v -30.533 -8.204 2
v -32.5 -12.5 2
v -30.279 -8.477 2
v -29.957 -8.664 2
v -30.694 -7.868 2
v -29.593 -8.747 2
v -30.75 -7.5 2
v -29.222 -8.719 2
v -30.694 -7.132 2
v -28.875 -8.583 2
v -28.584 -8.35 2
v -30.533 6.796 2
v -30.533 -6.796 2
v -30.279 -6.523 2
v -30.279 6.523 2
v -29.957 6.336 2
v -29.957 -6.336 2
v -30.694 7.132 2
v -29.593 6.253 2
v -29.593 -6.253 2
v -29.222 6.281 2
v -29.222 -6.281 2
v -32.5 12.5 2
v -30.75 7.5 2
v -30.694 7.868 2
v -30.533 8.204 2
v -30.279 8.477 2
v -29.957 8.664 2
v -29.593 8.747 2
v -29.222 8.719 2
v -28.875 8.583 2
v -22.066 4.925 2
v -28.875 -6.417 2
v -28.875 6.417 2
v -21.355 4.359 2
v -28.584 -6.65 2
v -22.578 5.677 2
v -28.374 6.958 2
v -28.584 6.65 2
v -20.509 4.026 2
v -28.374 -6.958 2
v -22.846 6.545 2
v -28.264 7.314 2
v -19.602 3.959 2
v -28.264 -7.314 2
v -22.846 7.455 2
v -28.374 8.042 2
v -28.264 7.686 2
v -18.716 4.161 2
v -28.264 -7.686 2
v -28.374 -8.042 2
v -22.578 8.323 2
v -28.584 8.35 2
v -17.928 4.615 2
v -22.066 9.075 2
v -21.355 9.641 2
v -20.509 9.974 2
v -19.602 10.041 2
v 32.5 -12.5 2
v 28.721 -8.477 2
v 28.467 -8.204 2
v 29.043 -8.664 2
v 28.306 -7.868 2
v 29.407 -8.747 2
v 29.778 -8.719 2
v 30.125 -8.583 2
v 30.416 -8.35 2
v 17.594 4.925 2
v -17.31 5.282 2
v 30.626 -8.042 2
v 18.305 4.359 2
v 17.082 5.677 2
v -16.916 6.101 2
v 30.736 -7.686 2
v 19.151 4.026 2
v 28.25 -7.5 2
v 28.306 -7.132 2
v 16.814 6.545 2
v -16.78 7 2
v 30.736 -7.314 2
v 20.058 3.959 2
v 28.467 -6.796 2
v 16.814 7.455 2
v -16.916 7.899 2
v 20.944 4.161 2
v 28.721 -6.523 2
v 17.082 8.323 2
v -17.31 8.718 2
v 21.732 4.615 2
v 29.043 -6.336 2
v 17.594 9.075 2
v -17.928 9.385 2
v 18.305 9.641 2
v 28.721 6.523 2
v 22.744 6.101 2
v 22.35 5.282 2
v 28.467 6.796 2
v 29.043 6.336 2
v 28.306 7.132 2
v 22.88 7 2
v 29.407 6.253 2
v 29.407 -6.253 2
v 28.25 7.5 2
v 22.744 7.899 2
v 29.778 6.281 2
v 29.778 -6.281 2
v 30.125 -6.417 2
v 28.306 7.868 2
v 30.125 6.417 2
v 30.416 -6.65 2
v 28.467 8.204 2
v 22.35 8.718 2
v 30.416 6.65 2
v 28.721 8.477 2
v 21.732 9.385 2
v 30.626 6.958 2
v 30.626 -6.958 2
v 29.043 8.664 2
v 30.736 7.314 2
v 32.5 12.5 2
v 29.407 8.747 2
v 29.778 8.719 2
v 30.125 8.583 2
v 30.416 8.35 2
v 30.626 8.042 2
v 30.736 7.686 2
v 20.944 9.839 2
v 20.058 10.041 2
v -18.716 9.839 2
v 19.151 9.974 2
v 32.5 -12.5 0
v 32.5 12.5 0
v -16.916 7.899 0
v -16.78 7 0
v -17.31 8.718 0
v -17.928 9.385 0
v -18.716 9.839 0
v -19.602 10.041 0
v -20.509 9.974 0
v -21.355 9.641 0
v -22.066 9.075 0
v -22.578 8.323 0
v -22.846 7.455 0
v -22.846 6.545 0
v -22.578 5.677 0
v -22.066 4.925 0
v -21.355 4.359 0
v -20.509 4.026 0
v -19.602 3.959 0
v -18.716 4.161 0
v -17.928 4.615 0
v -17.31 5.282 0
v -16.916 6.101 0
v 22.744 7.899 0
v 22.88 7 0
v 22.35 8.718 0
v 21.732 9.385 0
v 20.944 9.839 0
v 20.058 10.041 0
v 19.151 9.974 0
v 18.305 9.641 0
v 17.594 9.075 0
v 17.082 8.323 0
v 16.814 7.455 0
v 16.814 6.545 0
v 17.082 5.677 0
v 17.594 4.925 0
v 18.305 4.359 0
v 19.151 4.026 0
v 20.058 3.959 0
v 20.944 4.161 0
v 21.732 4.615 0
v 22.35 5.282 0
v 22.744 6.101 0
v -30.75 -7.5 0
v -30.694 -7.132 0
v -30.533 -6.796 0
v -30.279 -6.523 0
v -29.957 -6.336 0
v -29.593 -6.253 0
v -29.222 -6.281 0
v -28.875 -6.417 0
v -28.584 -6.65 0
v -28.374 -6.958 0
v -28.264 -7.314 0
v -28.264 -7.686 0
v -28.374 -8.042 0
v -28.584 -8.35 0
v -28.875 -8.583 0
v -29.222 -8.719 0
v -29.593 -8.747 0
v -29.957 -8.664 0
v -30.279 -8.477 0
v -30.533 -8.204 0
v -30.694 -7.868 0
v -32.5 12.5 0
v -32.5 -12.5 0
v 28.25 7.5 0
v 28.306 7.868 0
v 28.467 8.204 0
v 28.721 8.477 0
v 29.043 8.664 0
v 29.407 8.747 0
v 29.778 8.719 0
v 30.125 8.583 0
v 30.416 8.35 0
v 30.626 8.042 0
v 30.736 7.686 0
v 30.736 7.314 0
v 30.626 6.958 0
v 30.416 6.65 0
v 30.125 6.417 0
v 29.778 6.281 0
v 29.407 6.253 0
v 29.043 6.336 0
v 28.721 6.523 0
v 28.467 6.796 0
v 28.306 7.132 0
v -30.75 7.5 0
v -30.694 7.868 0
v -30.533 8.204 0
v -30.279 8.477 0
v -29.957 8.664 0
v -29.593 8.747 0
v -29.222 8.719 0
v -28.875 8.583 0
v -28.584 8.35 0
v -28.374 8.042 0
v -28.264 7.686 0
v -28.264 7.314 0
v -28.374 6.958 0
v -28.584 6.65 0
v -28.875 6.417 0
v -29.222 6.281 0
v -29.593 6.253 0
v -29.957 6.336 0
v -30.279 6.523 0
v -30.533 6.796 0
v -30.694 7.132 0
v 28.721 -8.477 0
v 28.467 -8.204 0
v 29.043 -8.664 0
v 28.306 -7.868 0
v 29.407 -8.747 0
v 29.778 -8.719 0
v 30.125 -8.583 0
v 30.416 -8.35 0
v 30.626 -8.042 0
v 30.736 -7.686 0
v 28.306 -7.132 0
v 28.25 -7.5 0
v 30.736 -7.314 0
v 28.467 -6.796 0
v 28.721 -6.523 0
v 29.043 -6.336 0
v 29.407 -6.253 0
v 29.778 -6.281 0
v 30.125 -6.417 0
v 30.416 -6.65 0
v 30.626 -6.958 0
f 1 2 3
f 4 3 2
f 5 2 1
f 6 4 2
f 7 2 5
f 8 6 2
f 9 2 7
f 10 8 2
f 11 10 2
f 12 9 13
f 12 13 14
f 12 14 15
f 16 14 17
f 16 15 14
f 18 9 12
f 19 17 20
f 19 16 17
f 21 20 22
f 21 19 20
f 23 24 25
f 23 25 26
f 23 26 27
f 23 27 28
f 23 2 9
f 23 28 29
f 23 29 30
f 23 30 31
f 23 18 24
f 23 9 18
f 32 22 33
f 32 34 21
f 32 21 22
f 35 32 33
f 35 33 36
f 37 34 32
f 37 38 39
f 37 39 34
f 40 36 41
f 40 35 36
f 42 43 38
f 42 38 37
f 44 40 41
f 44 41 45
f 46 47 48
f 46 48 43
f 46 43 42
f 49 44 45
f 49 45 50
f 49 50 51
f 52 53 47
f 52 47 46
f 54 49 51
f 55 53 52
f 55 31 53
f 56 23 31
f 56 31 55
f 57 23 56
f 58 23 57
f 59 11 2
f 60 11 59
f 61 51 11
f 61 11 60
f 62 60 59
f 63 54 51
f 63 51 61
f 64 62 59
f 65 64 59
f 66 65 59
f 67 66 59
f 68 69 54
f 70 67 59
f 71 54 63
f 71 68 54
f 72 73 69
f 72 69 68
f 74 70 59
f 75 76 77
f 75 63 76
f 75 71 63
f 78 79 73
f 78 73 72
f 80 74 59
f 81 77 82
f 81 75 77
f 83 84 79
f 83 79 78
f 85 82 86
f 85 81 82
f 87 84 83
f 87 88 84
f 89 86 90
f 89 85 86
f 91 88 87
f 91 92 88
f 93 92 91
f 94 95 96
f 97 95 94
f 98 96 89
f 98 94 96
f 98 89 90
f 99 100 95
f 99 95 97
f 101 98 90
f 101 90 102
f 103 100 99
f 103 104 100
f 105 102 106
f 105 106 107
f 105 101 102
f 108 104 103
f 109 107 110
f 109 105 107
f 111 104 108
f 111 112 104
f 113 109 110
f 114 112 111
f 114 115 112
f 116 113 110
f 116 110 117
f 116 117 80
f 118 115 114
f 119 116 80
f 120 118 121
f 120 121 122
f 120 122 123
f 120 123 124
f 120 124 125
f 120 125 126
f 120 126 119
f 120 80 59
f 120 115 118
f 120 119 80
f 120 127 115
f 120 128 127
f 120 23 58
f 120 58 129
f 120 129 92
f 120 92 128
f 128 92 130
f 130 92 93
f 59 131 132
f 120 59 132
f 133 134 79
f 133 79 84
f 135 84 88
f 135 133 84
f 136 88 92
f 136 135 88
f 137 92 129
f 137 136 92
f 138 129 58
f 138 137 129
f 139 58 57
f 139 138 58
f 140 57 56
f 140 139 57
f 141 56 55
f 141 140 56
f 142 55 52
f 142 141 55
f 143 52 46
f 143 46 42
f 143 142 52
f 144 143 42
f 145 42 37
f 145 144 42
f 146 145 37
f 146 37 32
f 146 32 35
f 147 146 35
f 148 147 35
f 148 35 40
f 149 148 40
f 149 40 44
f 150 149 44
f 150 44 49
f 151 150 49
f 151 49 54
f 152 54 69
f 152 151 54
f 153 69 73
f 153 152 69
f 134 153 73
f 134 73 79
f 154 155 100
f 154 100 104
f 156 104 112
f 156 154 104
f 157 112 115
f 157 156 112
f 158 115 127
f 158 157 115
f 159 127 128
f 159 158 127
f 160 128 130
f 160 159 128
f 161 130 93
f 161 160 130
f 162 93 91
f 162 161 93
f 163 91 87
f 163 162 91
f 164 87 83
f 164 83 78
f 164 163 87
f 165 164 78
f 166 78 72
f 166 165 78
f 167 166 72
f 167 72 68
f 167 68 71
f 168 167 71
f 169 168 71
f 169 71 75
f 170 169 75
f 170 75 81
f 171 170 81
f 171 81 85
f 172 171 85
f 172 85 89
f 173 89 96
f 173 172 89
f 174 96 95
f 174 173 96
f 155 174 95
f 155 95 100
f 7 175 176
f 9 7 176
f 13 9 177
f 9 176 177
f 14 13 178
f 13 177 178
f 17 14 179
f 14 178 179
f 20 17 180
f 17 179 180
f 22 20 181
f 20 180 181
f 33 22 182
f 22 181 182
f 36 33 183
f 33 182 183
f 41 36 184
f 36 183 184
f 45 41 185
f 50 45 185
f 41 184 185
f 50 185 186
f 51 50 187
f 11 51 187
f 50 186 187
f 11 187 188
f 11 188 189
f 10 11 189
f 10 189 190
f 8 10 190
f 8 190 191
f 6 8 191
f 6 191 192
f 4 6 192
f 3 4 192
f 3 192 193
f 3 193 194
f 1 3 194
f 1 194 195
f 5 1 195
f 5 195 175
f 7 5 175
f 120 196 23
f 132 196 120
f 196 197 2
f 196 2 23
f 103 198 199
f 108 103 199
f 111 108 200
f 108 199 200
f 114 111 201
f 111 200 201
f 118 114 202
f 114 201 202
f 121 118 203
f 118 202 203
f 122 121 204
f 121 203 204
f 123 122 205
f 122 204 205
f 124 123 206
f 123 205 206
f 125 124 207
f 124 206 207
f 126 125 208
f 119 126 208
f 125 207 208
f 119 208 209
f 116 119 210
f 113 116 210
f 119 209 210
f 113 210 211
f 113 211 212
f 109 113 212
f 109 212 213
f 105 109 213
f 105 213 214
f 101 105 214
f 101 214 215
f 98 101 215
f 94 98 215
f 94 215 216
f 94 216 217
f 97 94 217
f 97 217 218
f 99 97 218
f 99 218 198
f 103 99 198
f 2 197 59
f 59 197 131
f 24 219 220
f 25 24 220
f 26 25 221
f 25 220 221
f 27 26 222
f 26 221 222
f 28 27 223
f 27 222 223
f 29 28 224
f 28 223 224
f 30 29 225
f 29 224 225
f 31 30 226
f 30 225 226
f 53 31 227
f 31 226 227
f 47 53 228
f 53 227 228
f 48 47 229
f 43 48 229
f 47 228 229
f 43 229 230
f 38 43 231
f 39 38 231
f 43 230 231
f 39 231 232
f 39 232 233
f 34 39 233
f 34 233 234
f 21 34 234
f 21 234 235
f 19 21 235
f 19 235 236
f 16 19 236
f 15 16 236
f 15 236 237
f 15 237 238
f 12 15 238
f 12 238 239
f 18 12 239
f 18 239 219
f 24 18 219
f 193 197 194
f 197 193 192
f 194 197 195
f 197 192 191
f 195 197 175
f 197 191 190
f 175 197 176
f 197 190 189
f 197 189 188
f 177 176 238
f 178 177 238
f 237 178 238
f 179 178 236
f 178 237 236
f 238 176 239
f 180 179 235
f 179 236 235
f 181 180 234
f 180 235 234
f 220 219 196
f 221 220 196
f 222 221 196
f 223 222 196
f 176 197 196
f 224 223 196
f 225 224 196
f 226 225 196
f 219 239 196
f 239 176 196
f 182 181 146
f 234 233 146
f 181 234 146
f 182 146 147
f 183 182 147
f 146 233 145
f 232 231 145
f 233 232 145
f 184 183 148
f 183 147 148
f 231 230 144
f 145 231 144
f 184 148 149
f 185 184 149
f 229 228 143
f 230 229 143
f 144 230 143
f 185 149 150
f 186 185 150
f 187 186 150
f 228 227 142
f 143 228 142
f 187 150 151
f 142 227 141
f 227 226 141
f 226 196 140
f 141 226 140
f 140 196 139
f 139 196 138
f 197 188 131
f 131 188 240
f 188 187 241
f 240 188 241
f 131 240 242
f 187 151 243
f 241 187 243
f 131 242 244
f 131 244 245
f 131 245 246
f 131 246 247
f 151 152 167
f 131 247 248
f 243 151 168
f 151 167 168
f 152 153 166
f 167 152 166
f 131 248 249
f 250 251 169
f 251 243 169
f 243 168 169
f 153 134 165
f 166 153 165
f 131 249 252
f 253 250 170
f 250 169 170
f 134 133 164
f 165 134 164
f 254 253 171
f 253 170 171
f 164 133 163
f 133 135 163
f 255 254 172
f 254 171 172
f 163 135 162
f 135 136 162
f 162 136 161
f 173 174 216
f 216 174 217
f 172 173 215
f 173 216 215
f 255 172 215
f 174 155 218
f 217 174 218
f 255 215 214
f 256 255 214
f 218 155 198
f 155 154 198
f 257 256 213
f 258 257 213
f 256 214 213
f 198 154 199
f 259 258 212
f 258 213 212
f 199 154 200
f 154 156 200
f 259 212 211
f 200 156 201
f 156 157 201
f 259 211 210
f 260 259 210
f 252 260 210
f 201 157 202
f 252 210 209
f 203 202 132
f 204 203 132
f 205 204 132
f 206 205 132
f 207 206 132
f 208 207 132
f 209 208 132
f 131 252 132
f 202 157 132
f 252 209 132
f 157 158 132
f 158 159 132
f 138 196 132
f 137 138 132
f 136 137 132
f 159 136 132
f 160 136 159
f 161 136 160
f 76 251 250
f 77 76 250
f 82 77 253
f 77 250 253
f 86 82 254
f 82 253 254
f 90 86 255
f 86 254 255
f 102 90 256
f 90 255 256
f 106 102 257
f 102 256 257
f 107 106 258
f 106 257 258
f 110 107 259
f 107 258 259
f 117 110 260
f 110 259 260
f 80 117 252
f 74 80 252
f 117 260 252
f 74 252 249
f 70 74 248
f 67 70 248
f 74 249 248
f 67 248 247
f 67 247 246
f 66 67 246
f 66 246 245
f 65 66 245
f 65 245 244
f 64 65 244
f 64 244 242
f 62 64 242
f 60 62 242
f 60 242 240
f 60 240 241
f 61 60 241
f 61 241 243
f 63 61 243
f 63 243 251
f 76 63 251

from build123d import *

# Parameters (mm, degrees)
SKETCH_1_W      = 65
SKETCH_1_H      = 25
SKETCH_1_R      = 3.05
EXTRUDE_1_DEPTH = 2
M3X0_5_1_D      = 2.5
M3X0_5_1_DEPTH  = 8.5
M3X0_5_1_TIP    = 0.751075774


with BuildPart() as part:
    # ｽｹｯﾁ1 → ﾎﾞｽ - 押し出し1 (new body)
    with BuildSketch(Plane.XY):
        Rectangle(SKETCH_1_W, SKETCH_1_H)
        with Locations((-19.83, 7)):
            Circle(SKETCH_1_R, mode=Mode.SUBTRACT)
        with Locations((19.83, 7)):
            Circle(SKETCH_1_R, mode=Mode.SUBTRACT)
    extrude(amount=EXTRUDE_1_DEPTH)

    # M3x0.5 ねじ穴1
    with Locations(Plane(origin=(-29.5, 7.5, 2), x_dir=(1, 0, 0), z_dir=(0, 0, 1))):
        with Locations((0, 0), (0, -15), (59, 0), (59, -15)):
            Hole(M3X0_5_1_D / 2, depth=M3X0_5_1_DEPTH)
            with Locations((0, 0, -(M3X0_5_1_DEPTH + M3X0_5_1_TIP / 2))):  # 118° drill point
                Cone(0, M3X0_5_1_D / 2, M3X0_5_1_TIP, mode=Mode.SUBTRACT)


solid = part.part
